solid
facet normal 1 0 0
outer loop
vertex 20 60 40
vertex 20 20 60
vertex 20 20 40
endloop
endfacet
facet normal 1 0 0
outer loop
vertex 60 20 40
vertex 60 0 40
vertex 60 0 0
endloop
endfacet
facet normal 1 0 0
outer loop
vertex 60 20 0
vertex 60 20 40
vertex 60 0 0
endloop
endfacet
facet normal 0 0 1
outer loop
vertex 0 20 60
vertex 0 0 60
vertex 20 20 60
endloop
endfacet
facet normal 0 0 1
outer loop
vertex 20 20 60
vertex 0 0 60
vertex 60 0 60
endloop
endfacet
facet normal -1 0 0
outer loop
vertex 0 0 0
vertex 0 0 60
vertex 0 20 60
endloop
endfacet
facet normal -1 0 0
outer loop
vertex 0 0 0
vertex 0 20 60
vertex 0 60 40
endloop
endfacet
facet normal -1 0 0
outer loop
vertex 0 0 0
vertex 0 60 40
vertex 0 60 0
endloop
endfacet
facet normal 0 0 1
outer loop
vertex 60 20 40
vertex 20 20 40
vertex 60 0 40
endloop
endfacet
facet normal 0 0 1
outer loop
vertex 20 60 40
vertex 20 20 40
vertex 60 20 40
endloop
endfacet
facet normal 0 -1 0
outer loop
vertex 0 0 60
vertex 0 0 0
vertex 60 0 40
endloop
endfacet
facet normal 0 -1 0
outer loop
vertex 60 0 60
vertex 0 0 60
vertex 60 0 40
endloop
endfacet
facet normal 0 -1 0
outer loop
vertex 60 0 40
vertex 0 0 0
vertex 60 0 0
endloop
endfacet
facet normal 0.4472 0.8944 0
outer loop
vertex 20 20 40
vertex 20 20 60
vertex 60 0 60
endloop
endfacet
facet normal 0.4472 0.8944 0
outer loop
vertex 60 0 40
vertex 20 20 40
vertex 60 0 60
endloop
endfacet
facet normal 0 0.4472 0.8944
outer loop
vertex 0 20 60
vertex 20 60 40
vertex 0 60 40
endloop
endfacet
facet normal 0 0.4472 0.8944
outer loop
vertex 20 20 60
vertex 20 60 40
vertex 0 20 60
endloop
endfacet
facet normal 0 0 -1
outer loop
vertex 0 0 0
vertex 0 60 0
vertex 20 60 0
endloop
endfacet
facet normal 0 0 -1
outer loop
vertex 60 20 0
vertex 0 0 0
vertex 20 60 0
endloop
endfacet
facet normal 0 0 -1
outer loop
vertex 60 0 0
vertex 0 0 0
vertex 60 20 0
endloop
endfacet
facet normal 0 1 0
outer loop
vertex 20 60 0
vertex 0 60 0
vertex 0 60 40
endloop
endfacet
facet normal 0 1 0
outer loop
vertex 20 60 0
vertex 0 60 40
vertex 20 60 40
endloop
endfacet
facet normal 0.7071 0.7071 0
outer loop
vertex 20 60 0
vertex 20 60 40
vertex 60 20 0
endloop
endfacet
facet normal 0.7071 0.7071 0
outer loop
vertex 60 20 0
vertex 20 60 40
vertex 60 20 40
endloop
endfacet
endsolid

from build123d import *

# Parameters (mm, degrees)
CROQUIS1_W              = 60
CROQUIS1_H              = 60
SALIENTE_EXTRUIR1_DEPTH = 60
CROQUIS6_W              = 40
CROQUIS6_H              = 20
CORTAR_EXTRUIR2_DEPTH   = 40
CORTAR_EXTRUIR3_DEPTH   = 60
CORTAR_EXTRUIR4_DEPTH   = 20
CORTAR_EXTRUIR5_DEPTH   = 20


with BuildPart() as part:
    # Croquis1 → Saliente-Extruir1 (new body)
    with BuildSketch(Plane(origin=(0, 0, 0), x_dir=(1, 0, 0), z_dir=(0, 1, 0))):
        with Locations((30, -30)):
            Rectangle(CROQUIS1_W, CROQUIS1_H)
    extrude(amount=SALIENTE_EXTRUIR1_DEPTH)

    # Croquis6 → Cortar-Extruir2 (cut)
    with BuildSketch(Plane(origin=(0, 60, 0), x_dir=(1, 0, 0), z_dir=(0, 1, 0))):
        with Locations((40, -50)):
            Rectangle(CROQUIS6_W, CROQUIS6_H)
    extrude(amount=-CORTAR_EXTRUIR2_DEPTH, mode=Mode.SUBTRACT)

    # Croquis2 → Cortar-Extruir3 (cut)
    with BuildSketch(Plane.XY.offset(60)):
        Polygon((60, 60), (20, 60), (60, 20), align=None)
    extrude(amount=-CORTAR_EXTRUIR3_DEPTH, mode=Mode.SUBTRACT)

    # Croquis7 → Cortar-Extruir4 (cut)
    with BuildSketch(Plane.XY.offset(60)):
        Polygon((20, 20), (60, 0), (60, 20), align=None)
    extrude(amount=-CORTAR_EXTRUIR4_DEPTH, mode=Mode.SUBTRACT)

    # Croquis8 → Cortar-Extruir5 (cut)
    with BuildSketch(Plane(origin=(20, 0, 0), x_dir=(0, 0, -1), z_dir=(1, 0, 0))):
        Polygon((-40, 60), (-60, 20), (-60, 60), align=None)
    extrude(amount=-CORTAR_EXTRUIR5_DEPTH, mode=Mode.SUBTRACT)


solid = part.part
